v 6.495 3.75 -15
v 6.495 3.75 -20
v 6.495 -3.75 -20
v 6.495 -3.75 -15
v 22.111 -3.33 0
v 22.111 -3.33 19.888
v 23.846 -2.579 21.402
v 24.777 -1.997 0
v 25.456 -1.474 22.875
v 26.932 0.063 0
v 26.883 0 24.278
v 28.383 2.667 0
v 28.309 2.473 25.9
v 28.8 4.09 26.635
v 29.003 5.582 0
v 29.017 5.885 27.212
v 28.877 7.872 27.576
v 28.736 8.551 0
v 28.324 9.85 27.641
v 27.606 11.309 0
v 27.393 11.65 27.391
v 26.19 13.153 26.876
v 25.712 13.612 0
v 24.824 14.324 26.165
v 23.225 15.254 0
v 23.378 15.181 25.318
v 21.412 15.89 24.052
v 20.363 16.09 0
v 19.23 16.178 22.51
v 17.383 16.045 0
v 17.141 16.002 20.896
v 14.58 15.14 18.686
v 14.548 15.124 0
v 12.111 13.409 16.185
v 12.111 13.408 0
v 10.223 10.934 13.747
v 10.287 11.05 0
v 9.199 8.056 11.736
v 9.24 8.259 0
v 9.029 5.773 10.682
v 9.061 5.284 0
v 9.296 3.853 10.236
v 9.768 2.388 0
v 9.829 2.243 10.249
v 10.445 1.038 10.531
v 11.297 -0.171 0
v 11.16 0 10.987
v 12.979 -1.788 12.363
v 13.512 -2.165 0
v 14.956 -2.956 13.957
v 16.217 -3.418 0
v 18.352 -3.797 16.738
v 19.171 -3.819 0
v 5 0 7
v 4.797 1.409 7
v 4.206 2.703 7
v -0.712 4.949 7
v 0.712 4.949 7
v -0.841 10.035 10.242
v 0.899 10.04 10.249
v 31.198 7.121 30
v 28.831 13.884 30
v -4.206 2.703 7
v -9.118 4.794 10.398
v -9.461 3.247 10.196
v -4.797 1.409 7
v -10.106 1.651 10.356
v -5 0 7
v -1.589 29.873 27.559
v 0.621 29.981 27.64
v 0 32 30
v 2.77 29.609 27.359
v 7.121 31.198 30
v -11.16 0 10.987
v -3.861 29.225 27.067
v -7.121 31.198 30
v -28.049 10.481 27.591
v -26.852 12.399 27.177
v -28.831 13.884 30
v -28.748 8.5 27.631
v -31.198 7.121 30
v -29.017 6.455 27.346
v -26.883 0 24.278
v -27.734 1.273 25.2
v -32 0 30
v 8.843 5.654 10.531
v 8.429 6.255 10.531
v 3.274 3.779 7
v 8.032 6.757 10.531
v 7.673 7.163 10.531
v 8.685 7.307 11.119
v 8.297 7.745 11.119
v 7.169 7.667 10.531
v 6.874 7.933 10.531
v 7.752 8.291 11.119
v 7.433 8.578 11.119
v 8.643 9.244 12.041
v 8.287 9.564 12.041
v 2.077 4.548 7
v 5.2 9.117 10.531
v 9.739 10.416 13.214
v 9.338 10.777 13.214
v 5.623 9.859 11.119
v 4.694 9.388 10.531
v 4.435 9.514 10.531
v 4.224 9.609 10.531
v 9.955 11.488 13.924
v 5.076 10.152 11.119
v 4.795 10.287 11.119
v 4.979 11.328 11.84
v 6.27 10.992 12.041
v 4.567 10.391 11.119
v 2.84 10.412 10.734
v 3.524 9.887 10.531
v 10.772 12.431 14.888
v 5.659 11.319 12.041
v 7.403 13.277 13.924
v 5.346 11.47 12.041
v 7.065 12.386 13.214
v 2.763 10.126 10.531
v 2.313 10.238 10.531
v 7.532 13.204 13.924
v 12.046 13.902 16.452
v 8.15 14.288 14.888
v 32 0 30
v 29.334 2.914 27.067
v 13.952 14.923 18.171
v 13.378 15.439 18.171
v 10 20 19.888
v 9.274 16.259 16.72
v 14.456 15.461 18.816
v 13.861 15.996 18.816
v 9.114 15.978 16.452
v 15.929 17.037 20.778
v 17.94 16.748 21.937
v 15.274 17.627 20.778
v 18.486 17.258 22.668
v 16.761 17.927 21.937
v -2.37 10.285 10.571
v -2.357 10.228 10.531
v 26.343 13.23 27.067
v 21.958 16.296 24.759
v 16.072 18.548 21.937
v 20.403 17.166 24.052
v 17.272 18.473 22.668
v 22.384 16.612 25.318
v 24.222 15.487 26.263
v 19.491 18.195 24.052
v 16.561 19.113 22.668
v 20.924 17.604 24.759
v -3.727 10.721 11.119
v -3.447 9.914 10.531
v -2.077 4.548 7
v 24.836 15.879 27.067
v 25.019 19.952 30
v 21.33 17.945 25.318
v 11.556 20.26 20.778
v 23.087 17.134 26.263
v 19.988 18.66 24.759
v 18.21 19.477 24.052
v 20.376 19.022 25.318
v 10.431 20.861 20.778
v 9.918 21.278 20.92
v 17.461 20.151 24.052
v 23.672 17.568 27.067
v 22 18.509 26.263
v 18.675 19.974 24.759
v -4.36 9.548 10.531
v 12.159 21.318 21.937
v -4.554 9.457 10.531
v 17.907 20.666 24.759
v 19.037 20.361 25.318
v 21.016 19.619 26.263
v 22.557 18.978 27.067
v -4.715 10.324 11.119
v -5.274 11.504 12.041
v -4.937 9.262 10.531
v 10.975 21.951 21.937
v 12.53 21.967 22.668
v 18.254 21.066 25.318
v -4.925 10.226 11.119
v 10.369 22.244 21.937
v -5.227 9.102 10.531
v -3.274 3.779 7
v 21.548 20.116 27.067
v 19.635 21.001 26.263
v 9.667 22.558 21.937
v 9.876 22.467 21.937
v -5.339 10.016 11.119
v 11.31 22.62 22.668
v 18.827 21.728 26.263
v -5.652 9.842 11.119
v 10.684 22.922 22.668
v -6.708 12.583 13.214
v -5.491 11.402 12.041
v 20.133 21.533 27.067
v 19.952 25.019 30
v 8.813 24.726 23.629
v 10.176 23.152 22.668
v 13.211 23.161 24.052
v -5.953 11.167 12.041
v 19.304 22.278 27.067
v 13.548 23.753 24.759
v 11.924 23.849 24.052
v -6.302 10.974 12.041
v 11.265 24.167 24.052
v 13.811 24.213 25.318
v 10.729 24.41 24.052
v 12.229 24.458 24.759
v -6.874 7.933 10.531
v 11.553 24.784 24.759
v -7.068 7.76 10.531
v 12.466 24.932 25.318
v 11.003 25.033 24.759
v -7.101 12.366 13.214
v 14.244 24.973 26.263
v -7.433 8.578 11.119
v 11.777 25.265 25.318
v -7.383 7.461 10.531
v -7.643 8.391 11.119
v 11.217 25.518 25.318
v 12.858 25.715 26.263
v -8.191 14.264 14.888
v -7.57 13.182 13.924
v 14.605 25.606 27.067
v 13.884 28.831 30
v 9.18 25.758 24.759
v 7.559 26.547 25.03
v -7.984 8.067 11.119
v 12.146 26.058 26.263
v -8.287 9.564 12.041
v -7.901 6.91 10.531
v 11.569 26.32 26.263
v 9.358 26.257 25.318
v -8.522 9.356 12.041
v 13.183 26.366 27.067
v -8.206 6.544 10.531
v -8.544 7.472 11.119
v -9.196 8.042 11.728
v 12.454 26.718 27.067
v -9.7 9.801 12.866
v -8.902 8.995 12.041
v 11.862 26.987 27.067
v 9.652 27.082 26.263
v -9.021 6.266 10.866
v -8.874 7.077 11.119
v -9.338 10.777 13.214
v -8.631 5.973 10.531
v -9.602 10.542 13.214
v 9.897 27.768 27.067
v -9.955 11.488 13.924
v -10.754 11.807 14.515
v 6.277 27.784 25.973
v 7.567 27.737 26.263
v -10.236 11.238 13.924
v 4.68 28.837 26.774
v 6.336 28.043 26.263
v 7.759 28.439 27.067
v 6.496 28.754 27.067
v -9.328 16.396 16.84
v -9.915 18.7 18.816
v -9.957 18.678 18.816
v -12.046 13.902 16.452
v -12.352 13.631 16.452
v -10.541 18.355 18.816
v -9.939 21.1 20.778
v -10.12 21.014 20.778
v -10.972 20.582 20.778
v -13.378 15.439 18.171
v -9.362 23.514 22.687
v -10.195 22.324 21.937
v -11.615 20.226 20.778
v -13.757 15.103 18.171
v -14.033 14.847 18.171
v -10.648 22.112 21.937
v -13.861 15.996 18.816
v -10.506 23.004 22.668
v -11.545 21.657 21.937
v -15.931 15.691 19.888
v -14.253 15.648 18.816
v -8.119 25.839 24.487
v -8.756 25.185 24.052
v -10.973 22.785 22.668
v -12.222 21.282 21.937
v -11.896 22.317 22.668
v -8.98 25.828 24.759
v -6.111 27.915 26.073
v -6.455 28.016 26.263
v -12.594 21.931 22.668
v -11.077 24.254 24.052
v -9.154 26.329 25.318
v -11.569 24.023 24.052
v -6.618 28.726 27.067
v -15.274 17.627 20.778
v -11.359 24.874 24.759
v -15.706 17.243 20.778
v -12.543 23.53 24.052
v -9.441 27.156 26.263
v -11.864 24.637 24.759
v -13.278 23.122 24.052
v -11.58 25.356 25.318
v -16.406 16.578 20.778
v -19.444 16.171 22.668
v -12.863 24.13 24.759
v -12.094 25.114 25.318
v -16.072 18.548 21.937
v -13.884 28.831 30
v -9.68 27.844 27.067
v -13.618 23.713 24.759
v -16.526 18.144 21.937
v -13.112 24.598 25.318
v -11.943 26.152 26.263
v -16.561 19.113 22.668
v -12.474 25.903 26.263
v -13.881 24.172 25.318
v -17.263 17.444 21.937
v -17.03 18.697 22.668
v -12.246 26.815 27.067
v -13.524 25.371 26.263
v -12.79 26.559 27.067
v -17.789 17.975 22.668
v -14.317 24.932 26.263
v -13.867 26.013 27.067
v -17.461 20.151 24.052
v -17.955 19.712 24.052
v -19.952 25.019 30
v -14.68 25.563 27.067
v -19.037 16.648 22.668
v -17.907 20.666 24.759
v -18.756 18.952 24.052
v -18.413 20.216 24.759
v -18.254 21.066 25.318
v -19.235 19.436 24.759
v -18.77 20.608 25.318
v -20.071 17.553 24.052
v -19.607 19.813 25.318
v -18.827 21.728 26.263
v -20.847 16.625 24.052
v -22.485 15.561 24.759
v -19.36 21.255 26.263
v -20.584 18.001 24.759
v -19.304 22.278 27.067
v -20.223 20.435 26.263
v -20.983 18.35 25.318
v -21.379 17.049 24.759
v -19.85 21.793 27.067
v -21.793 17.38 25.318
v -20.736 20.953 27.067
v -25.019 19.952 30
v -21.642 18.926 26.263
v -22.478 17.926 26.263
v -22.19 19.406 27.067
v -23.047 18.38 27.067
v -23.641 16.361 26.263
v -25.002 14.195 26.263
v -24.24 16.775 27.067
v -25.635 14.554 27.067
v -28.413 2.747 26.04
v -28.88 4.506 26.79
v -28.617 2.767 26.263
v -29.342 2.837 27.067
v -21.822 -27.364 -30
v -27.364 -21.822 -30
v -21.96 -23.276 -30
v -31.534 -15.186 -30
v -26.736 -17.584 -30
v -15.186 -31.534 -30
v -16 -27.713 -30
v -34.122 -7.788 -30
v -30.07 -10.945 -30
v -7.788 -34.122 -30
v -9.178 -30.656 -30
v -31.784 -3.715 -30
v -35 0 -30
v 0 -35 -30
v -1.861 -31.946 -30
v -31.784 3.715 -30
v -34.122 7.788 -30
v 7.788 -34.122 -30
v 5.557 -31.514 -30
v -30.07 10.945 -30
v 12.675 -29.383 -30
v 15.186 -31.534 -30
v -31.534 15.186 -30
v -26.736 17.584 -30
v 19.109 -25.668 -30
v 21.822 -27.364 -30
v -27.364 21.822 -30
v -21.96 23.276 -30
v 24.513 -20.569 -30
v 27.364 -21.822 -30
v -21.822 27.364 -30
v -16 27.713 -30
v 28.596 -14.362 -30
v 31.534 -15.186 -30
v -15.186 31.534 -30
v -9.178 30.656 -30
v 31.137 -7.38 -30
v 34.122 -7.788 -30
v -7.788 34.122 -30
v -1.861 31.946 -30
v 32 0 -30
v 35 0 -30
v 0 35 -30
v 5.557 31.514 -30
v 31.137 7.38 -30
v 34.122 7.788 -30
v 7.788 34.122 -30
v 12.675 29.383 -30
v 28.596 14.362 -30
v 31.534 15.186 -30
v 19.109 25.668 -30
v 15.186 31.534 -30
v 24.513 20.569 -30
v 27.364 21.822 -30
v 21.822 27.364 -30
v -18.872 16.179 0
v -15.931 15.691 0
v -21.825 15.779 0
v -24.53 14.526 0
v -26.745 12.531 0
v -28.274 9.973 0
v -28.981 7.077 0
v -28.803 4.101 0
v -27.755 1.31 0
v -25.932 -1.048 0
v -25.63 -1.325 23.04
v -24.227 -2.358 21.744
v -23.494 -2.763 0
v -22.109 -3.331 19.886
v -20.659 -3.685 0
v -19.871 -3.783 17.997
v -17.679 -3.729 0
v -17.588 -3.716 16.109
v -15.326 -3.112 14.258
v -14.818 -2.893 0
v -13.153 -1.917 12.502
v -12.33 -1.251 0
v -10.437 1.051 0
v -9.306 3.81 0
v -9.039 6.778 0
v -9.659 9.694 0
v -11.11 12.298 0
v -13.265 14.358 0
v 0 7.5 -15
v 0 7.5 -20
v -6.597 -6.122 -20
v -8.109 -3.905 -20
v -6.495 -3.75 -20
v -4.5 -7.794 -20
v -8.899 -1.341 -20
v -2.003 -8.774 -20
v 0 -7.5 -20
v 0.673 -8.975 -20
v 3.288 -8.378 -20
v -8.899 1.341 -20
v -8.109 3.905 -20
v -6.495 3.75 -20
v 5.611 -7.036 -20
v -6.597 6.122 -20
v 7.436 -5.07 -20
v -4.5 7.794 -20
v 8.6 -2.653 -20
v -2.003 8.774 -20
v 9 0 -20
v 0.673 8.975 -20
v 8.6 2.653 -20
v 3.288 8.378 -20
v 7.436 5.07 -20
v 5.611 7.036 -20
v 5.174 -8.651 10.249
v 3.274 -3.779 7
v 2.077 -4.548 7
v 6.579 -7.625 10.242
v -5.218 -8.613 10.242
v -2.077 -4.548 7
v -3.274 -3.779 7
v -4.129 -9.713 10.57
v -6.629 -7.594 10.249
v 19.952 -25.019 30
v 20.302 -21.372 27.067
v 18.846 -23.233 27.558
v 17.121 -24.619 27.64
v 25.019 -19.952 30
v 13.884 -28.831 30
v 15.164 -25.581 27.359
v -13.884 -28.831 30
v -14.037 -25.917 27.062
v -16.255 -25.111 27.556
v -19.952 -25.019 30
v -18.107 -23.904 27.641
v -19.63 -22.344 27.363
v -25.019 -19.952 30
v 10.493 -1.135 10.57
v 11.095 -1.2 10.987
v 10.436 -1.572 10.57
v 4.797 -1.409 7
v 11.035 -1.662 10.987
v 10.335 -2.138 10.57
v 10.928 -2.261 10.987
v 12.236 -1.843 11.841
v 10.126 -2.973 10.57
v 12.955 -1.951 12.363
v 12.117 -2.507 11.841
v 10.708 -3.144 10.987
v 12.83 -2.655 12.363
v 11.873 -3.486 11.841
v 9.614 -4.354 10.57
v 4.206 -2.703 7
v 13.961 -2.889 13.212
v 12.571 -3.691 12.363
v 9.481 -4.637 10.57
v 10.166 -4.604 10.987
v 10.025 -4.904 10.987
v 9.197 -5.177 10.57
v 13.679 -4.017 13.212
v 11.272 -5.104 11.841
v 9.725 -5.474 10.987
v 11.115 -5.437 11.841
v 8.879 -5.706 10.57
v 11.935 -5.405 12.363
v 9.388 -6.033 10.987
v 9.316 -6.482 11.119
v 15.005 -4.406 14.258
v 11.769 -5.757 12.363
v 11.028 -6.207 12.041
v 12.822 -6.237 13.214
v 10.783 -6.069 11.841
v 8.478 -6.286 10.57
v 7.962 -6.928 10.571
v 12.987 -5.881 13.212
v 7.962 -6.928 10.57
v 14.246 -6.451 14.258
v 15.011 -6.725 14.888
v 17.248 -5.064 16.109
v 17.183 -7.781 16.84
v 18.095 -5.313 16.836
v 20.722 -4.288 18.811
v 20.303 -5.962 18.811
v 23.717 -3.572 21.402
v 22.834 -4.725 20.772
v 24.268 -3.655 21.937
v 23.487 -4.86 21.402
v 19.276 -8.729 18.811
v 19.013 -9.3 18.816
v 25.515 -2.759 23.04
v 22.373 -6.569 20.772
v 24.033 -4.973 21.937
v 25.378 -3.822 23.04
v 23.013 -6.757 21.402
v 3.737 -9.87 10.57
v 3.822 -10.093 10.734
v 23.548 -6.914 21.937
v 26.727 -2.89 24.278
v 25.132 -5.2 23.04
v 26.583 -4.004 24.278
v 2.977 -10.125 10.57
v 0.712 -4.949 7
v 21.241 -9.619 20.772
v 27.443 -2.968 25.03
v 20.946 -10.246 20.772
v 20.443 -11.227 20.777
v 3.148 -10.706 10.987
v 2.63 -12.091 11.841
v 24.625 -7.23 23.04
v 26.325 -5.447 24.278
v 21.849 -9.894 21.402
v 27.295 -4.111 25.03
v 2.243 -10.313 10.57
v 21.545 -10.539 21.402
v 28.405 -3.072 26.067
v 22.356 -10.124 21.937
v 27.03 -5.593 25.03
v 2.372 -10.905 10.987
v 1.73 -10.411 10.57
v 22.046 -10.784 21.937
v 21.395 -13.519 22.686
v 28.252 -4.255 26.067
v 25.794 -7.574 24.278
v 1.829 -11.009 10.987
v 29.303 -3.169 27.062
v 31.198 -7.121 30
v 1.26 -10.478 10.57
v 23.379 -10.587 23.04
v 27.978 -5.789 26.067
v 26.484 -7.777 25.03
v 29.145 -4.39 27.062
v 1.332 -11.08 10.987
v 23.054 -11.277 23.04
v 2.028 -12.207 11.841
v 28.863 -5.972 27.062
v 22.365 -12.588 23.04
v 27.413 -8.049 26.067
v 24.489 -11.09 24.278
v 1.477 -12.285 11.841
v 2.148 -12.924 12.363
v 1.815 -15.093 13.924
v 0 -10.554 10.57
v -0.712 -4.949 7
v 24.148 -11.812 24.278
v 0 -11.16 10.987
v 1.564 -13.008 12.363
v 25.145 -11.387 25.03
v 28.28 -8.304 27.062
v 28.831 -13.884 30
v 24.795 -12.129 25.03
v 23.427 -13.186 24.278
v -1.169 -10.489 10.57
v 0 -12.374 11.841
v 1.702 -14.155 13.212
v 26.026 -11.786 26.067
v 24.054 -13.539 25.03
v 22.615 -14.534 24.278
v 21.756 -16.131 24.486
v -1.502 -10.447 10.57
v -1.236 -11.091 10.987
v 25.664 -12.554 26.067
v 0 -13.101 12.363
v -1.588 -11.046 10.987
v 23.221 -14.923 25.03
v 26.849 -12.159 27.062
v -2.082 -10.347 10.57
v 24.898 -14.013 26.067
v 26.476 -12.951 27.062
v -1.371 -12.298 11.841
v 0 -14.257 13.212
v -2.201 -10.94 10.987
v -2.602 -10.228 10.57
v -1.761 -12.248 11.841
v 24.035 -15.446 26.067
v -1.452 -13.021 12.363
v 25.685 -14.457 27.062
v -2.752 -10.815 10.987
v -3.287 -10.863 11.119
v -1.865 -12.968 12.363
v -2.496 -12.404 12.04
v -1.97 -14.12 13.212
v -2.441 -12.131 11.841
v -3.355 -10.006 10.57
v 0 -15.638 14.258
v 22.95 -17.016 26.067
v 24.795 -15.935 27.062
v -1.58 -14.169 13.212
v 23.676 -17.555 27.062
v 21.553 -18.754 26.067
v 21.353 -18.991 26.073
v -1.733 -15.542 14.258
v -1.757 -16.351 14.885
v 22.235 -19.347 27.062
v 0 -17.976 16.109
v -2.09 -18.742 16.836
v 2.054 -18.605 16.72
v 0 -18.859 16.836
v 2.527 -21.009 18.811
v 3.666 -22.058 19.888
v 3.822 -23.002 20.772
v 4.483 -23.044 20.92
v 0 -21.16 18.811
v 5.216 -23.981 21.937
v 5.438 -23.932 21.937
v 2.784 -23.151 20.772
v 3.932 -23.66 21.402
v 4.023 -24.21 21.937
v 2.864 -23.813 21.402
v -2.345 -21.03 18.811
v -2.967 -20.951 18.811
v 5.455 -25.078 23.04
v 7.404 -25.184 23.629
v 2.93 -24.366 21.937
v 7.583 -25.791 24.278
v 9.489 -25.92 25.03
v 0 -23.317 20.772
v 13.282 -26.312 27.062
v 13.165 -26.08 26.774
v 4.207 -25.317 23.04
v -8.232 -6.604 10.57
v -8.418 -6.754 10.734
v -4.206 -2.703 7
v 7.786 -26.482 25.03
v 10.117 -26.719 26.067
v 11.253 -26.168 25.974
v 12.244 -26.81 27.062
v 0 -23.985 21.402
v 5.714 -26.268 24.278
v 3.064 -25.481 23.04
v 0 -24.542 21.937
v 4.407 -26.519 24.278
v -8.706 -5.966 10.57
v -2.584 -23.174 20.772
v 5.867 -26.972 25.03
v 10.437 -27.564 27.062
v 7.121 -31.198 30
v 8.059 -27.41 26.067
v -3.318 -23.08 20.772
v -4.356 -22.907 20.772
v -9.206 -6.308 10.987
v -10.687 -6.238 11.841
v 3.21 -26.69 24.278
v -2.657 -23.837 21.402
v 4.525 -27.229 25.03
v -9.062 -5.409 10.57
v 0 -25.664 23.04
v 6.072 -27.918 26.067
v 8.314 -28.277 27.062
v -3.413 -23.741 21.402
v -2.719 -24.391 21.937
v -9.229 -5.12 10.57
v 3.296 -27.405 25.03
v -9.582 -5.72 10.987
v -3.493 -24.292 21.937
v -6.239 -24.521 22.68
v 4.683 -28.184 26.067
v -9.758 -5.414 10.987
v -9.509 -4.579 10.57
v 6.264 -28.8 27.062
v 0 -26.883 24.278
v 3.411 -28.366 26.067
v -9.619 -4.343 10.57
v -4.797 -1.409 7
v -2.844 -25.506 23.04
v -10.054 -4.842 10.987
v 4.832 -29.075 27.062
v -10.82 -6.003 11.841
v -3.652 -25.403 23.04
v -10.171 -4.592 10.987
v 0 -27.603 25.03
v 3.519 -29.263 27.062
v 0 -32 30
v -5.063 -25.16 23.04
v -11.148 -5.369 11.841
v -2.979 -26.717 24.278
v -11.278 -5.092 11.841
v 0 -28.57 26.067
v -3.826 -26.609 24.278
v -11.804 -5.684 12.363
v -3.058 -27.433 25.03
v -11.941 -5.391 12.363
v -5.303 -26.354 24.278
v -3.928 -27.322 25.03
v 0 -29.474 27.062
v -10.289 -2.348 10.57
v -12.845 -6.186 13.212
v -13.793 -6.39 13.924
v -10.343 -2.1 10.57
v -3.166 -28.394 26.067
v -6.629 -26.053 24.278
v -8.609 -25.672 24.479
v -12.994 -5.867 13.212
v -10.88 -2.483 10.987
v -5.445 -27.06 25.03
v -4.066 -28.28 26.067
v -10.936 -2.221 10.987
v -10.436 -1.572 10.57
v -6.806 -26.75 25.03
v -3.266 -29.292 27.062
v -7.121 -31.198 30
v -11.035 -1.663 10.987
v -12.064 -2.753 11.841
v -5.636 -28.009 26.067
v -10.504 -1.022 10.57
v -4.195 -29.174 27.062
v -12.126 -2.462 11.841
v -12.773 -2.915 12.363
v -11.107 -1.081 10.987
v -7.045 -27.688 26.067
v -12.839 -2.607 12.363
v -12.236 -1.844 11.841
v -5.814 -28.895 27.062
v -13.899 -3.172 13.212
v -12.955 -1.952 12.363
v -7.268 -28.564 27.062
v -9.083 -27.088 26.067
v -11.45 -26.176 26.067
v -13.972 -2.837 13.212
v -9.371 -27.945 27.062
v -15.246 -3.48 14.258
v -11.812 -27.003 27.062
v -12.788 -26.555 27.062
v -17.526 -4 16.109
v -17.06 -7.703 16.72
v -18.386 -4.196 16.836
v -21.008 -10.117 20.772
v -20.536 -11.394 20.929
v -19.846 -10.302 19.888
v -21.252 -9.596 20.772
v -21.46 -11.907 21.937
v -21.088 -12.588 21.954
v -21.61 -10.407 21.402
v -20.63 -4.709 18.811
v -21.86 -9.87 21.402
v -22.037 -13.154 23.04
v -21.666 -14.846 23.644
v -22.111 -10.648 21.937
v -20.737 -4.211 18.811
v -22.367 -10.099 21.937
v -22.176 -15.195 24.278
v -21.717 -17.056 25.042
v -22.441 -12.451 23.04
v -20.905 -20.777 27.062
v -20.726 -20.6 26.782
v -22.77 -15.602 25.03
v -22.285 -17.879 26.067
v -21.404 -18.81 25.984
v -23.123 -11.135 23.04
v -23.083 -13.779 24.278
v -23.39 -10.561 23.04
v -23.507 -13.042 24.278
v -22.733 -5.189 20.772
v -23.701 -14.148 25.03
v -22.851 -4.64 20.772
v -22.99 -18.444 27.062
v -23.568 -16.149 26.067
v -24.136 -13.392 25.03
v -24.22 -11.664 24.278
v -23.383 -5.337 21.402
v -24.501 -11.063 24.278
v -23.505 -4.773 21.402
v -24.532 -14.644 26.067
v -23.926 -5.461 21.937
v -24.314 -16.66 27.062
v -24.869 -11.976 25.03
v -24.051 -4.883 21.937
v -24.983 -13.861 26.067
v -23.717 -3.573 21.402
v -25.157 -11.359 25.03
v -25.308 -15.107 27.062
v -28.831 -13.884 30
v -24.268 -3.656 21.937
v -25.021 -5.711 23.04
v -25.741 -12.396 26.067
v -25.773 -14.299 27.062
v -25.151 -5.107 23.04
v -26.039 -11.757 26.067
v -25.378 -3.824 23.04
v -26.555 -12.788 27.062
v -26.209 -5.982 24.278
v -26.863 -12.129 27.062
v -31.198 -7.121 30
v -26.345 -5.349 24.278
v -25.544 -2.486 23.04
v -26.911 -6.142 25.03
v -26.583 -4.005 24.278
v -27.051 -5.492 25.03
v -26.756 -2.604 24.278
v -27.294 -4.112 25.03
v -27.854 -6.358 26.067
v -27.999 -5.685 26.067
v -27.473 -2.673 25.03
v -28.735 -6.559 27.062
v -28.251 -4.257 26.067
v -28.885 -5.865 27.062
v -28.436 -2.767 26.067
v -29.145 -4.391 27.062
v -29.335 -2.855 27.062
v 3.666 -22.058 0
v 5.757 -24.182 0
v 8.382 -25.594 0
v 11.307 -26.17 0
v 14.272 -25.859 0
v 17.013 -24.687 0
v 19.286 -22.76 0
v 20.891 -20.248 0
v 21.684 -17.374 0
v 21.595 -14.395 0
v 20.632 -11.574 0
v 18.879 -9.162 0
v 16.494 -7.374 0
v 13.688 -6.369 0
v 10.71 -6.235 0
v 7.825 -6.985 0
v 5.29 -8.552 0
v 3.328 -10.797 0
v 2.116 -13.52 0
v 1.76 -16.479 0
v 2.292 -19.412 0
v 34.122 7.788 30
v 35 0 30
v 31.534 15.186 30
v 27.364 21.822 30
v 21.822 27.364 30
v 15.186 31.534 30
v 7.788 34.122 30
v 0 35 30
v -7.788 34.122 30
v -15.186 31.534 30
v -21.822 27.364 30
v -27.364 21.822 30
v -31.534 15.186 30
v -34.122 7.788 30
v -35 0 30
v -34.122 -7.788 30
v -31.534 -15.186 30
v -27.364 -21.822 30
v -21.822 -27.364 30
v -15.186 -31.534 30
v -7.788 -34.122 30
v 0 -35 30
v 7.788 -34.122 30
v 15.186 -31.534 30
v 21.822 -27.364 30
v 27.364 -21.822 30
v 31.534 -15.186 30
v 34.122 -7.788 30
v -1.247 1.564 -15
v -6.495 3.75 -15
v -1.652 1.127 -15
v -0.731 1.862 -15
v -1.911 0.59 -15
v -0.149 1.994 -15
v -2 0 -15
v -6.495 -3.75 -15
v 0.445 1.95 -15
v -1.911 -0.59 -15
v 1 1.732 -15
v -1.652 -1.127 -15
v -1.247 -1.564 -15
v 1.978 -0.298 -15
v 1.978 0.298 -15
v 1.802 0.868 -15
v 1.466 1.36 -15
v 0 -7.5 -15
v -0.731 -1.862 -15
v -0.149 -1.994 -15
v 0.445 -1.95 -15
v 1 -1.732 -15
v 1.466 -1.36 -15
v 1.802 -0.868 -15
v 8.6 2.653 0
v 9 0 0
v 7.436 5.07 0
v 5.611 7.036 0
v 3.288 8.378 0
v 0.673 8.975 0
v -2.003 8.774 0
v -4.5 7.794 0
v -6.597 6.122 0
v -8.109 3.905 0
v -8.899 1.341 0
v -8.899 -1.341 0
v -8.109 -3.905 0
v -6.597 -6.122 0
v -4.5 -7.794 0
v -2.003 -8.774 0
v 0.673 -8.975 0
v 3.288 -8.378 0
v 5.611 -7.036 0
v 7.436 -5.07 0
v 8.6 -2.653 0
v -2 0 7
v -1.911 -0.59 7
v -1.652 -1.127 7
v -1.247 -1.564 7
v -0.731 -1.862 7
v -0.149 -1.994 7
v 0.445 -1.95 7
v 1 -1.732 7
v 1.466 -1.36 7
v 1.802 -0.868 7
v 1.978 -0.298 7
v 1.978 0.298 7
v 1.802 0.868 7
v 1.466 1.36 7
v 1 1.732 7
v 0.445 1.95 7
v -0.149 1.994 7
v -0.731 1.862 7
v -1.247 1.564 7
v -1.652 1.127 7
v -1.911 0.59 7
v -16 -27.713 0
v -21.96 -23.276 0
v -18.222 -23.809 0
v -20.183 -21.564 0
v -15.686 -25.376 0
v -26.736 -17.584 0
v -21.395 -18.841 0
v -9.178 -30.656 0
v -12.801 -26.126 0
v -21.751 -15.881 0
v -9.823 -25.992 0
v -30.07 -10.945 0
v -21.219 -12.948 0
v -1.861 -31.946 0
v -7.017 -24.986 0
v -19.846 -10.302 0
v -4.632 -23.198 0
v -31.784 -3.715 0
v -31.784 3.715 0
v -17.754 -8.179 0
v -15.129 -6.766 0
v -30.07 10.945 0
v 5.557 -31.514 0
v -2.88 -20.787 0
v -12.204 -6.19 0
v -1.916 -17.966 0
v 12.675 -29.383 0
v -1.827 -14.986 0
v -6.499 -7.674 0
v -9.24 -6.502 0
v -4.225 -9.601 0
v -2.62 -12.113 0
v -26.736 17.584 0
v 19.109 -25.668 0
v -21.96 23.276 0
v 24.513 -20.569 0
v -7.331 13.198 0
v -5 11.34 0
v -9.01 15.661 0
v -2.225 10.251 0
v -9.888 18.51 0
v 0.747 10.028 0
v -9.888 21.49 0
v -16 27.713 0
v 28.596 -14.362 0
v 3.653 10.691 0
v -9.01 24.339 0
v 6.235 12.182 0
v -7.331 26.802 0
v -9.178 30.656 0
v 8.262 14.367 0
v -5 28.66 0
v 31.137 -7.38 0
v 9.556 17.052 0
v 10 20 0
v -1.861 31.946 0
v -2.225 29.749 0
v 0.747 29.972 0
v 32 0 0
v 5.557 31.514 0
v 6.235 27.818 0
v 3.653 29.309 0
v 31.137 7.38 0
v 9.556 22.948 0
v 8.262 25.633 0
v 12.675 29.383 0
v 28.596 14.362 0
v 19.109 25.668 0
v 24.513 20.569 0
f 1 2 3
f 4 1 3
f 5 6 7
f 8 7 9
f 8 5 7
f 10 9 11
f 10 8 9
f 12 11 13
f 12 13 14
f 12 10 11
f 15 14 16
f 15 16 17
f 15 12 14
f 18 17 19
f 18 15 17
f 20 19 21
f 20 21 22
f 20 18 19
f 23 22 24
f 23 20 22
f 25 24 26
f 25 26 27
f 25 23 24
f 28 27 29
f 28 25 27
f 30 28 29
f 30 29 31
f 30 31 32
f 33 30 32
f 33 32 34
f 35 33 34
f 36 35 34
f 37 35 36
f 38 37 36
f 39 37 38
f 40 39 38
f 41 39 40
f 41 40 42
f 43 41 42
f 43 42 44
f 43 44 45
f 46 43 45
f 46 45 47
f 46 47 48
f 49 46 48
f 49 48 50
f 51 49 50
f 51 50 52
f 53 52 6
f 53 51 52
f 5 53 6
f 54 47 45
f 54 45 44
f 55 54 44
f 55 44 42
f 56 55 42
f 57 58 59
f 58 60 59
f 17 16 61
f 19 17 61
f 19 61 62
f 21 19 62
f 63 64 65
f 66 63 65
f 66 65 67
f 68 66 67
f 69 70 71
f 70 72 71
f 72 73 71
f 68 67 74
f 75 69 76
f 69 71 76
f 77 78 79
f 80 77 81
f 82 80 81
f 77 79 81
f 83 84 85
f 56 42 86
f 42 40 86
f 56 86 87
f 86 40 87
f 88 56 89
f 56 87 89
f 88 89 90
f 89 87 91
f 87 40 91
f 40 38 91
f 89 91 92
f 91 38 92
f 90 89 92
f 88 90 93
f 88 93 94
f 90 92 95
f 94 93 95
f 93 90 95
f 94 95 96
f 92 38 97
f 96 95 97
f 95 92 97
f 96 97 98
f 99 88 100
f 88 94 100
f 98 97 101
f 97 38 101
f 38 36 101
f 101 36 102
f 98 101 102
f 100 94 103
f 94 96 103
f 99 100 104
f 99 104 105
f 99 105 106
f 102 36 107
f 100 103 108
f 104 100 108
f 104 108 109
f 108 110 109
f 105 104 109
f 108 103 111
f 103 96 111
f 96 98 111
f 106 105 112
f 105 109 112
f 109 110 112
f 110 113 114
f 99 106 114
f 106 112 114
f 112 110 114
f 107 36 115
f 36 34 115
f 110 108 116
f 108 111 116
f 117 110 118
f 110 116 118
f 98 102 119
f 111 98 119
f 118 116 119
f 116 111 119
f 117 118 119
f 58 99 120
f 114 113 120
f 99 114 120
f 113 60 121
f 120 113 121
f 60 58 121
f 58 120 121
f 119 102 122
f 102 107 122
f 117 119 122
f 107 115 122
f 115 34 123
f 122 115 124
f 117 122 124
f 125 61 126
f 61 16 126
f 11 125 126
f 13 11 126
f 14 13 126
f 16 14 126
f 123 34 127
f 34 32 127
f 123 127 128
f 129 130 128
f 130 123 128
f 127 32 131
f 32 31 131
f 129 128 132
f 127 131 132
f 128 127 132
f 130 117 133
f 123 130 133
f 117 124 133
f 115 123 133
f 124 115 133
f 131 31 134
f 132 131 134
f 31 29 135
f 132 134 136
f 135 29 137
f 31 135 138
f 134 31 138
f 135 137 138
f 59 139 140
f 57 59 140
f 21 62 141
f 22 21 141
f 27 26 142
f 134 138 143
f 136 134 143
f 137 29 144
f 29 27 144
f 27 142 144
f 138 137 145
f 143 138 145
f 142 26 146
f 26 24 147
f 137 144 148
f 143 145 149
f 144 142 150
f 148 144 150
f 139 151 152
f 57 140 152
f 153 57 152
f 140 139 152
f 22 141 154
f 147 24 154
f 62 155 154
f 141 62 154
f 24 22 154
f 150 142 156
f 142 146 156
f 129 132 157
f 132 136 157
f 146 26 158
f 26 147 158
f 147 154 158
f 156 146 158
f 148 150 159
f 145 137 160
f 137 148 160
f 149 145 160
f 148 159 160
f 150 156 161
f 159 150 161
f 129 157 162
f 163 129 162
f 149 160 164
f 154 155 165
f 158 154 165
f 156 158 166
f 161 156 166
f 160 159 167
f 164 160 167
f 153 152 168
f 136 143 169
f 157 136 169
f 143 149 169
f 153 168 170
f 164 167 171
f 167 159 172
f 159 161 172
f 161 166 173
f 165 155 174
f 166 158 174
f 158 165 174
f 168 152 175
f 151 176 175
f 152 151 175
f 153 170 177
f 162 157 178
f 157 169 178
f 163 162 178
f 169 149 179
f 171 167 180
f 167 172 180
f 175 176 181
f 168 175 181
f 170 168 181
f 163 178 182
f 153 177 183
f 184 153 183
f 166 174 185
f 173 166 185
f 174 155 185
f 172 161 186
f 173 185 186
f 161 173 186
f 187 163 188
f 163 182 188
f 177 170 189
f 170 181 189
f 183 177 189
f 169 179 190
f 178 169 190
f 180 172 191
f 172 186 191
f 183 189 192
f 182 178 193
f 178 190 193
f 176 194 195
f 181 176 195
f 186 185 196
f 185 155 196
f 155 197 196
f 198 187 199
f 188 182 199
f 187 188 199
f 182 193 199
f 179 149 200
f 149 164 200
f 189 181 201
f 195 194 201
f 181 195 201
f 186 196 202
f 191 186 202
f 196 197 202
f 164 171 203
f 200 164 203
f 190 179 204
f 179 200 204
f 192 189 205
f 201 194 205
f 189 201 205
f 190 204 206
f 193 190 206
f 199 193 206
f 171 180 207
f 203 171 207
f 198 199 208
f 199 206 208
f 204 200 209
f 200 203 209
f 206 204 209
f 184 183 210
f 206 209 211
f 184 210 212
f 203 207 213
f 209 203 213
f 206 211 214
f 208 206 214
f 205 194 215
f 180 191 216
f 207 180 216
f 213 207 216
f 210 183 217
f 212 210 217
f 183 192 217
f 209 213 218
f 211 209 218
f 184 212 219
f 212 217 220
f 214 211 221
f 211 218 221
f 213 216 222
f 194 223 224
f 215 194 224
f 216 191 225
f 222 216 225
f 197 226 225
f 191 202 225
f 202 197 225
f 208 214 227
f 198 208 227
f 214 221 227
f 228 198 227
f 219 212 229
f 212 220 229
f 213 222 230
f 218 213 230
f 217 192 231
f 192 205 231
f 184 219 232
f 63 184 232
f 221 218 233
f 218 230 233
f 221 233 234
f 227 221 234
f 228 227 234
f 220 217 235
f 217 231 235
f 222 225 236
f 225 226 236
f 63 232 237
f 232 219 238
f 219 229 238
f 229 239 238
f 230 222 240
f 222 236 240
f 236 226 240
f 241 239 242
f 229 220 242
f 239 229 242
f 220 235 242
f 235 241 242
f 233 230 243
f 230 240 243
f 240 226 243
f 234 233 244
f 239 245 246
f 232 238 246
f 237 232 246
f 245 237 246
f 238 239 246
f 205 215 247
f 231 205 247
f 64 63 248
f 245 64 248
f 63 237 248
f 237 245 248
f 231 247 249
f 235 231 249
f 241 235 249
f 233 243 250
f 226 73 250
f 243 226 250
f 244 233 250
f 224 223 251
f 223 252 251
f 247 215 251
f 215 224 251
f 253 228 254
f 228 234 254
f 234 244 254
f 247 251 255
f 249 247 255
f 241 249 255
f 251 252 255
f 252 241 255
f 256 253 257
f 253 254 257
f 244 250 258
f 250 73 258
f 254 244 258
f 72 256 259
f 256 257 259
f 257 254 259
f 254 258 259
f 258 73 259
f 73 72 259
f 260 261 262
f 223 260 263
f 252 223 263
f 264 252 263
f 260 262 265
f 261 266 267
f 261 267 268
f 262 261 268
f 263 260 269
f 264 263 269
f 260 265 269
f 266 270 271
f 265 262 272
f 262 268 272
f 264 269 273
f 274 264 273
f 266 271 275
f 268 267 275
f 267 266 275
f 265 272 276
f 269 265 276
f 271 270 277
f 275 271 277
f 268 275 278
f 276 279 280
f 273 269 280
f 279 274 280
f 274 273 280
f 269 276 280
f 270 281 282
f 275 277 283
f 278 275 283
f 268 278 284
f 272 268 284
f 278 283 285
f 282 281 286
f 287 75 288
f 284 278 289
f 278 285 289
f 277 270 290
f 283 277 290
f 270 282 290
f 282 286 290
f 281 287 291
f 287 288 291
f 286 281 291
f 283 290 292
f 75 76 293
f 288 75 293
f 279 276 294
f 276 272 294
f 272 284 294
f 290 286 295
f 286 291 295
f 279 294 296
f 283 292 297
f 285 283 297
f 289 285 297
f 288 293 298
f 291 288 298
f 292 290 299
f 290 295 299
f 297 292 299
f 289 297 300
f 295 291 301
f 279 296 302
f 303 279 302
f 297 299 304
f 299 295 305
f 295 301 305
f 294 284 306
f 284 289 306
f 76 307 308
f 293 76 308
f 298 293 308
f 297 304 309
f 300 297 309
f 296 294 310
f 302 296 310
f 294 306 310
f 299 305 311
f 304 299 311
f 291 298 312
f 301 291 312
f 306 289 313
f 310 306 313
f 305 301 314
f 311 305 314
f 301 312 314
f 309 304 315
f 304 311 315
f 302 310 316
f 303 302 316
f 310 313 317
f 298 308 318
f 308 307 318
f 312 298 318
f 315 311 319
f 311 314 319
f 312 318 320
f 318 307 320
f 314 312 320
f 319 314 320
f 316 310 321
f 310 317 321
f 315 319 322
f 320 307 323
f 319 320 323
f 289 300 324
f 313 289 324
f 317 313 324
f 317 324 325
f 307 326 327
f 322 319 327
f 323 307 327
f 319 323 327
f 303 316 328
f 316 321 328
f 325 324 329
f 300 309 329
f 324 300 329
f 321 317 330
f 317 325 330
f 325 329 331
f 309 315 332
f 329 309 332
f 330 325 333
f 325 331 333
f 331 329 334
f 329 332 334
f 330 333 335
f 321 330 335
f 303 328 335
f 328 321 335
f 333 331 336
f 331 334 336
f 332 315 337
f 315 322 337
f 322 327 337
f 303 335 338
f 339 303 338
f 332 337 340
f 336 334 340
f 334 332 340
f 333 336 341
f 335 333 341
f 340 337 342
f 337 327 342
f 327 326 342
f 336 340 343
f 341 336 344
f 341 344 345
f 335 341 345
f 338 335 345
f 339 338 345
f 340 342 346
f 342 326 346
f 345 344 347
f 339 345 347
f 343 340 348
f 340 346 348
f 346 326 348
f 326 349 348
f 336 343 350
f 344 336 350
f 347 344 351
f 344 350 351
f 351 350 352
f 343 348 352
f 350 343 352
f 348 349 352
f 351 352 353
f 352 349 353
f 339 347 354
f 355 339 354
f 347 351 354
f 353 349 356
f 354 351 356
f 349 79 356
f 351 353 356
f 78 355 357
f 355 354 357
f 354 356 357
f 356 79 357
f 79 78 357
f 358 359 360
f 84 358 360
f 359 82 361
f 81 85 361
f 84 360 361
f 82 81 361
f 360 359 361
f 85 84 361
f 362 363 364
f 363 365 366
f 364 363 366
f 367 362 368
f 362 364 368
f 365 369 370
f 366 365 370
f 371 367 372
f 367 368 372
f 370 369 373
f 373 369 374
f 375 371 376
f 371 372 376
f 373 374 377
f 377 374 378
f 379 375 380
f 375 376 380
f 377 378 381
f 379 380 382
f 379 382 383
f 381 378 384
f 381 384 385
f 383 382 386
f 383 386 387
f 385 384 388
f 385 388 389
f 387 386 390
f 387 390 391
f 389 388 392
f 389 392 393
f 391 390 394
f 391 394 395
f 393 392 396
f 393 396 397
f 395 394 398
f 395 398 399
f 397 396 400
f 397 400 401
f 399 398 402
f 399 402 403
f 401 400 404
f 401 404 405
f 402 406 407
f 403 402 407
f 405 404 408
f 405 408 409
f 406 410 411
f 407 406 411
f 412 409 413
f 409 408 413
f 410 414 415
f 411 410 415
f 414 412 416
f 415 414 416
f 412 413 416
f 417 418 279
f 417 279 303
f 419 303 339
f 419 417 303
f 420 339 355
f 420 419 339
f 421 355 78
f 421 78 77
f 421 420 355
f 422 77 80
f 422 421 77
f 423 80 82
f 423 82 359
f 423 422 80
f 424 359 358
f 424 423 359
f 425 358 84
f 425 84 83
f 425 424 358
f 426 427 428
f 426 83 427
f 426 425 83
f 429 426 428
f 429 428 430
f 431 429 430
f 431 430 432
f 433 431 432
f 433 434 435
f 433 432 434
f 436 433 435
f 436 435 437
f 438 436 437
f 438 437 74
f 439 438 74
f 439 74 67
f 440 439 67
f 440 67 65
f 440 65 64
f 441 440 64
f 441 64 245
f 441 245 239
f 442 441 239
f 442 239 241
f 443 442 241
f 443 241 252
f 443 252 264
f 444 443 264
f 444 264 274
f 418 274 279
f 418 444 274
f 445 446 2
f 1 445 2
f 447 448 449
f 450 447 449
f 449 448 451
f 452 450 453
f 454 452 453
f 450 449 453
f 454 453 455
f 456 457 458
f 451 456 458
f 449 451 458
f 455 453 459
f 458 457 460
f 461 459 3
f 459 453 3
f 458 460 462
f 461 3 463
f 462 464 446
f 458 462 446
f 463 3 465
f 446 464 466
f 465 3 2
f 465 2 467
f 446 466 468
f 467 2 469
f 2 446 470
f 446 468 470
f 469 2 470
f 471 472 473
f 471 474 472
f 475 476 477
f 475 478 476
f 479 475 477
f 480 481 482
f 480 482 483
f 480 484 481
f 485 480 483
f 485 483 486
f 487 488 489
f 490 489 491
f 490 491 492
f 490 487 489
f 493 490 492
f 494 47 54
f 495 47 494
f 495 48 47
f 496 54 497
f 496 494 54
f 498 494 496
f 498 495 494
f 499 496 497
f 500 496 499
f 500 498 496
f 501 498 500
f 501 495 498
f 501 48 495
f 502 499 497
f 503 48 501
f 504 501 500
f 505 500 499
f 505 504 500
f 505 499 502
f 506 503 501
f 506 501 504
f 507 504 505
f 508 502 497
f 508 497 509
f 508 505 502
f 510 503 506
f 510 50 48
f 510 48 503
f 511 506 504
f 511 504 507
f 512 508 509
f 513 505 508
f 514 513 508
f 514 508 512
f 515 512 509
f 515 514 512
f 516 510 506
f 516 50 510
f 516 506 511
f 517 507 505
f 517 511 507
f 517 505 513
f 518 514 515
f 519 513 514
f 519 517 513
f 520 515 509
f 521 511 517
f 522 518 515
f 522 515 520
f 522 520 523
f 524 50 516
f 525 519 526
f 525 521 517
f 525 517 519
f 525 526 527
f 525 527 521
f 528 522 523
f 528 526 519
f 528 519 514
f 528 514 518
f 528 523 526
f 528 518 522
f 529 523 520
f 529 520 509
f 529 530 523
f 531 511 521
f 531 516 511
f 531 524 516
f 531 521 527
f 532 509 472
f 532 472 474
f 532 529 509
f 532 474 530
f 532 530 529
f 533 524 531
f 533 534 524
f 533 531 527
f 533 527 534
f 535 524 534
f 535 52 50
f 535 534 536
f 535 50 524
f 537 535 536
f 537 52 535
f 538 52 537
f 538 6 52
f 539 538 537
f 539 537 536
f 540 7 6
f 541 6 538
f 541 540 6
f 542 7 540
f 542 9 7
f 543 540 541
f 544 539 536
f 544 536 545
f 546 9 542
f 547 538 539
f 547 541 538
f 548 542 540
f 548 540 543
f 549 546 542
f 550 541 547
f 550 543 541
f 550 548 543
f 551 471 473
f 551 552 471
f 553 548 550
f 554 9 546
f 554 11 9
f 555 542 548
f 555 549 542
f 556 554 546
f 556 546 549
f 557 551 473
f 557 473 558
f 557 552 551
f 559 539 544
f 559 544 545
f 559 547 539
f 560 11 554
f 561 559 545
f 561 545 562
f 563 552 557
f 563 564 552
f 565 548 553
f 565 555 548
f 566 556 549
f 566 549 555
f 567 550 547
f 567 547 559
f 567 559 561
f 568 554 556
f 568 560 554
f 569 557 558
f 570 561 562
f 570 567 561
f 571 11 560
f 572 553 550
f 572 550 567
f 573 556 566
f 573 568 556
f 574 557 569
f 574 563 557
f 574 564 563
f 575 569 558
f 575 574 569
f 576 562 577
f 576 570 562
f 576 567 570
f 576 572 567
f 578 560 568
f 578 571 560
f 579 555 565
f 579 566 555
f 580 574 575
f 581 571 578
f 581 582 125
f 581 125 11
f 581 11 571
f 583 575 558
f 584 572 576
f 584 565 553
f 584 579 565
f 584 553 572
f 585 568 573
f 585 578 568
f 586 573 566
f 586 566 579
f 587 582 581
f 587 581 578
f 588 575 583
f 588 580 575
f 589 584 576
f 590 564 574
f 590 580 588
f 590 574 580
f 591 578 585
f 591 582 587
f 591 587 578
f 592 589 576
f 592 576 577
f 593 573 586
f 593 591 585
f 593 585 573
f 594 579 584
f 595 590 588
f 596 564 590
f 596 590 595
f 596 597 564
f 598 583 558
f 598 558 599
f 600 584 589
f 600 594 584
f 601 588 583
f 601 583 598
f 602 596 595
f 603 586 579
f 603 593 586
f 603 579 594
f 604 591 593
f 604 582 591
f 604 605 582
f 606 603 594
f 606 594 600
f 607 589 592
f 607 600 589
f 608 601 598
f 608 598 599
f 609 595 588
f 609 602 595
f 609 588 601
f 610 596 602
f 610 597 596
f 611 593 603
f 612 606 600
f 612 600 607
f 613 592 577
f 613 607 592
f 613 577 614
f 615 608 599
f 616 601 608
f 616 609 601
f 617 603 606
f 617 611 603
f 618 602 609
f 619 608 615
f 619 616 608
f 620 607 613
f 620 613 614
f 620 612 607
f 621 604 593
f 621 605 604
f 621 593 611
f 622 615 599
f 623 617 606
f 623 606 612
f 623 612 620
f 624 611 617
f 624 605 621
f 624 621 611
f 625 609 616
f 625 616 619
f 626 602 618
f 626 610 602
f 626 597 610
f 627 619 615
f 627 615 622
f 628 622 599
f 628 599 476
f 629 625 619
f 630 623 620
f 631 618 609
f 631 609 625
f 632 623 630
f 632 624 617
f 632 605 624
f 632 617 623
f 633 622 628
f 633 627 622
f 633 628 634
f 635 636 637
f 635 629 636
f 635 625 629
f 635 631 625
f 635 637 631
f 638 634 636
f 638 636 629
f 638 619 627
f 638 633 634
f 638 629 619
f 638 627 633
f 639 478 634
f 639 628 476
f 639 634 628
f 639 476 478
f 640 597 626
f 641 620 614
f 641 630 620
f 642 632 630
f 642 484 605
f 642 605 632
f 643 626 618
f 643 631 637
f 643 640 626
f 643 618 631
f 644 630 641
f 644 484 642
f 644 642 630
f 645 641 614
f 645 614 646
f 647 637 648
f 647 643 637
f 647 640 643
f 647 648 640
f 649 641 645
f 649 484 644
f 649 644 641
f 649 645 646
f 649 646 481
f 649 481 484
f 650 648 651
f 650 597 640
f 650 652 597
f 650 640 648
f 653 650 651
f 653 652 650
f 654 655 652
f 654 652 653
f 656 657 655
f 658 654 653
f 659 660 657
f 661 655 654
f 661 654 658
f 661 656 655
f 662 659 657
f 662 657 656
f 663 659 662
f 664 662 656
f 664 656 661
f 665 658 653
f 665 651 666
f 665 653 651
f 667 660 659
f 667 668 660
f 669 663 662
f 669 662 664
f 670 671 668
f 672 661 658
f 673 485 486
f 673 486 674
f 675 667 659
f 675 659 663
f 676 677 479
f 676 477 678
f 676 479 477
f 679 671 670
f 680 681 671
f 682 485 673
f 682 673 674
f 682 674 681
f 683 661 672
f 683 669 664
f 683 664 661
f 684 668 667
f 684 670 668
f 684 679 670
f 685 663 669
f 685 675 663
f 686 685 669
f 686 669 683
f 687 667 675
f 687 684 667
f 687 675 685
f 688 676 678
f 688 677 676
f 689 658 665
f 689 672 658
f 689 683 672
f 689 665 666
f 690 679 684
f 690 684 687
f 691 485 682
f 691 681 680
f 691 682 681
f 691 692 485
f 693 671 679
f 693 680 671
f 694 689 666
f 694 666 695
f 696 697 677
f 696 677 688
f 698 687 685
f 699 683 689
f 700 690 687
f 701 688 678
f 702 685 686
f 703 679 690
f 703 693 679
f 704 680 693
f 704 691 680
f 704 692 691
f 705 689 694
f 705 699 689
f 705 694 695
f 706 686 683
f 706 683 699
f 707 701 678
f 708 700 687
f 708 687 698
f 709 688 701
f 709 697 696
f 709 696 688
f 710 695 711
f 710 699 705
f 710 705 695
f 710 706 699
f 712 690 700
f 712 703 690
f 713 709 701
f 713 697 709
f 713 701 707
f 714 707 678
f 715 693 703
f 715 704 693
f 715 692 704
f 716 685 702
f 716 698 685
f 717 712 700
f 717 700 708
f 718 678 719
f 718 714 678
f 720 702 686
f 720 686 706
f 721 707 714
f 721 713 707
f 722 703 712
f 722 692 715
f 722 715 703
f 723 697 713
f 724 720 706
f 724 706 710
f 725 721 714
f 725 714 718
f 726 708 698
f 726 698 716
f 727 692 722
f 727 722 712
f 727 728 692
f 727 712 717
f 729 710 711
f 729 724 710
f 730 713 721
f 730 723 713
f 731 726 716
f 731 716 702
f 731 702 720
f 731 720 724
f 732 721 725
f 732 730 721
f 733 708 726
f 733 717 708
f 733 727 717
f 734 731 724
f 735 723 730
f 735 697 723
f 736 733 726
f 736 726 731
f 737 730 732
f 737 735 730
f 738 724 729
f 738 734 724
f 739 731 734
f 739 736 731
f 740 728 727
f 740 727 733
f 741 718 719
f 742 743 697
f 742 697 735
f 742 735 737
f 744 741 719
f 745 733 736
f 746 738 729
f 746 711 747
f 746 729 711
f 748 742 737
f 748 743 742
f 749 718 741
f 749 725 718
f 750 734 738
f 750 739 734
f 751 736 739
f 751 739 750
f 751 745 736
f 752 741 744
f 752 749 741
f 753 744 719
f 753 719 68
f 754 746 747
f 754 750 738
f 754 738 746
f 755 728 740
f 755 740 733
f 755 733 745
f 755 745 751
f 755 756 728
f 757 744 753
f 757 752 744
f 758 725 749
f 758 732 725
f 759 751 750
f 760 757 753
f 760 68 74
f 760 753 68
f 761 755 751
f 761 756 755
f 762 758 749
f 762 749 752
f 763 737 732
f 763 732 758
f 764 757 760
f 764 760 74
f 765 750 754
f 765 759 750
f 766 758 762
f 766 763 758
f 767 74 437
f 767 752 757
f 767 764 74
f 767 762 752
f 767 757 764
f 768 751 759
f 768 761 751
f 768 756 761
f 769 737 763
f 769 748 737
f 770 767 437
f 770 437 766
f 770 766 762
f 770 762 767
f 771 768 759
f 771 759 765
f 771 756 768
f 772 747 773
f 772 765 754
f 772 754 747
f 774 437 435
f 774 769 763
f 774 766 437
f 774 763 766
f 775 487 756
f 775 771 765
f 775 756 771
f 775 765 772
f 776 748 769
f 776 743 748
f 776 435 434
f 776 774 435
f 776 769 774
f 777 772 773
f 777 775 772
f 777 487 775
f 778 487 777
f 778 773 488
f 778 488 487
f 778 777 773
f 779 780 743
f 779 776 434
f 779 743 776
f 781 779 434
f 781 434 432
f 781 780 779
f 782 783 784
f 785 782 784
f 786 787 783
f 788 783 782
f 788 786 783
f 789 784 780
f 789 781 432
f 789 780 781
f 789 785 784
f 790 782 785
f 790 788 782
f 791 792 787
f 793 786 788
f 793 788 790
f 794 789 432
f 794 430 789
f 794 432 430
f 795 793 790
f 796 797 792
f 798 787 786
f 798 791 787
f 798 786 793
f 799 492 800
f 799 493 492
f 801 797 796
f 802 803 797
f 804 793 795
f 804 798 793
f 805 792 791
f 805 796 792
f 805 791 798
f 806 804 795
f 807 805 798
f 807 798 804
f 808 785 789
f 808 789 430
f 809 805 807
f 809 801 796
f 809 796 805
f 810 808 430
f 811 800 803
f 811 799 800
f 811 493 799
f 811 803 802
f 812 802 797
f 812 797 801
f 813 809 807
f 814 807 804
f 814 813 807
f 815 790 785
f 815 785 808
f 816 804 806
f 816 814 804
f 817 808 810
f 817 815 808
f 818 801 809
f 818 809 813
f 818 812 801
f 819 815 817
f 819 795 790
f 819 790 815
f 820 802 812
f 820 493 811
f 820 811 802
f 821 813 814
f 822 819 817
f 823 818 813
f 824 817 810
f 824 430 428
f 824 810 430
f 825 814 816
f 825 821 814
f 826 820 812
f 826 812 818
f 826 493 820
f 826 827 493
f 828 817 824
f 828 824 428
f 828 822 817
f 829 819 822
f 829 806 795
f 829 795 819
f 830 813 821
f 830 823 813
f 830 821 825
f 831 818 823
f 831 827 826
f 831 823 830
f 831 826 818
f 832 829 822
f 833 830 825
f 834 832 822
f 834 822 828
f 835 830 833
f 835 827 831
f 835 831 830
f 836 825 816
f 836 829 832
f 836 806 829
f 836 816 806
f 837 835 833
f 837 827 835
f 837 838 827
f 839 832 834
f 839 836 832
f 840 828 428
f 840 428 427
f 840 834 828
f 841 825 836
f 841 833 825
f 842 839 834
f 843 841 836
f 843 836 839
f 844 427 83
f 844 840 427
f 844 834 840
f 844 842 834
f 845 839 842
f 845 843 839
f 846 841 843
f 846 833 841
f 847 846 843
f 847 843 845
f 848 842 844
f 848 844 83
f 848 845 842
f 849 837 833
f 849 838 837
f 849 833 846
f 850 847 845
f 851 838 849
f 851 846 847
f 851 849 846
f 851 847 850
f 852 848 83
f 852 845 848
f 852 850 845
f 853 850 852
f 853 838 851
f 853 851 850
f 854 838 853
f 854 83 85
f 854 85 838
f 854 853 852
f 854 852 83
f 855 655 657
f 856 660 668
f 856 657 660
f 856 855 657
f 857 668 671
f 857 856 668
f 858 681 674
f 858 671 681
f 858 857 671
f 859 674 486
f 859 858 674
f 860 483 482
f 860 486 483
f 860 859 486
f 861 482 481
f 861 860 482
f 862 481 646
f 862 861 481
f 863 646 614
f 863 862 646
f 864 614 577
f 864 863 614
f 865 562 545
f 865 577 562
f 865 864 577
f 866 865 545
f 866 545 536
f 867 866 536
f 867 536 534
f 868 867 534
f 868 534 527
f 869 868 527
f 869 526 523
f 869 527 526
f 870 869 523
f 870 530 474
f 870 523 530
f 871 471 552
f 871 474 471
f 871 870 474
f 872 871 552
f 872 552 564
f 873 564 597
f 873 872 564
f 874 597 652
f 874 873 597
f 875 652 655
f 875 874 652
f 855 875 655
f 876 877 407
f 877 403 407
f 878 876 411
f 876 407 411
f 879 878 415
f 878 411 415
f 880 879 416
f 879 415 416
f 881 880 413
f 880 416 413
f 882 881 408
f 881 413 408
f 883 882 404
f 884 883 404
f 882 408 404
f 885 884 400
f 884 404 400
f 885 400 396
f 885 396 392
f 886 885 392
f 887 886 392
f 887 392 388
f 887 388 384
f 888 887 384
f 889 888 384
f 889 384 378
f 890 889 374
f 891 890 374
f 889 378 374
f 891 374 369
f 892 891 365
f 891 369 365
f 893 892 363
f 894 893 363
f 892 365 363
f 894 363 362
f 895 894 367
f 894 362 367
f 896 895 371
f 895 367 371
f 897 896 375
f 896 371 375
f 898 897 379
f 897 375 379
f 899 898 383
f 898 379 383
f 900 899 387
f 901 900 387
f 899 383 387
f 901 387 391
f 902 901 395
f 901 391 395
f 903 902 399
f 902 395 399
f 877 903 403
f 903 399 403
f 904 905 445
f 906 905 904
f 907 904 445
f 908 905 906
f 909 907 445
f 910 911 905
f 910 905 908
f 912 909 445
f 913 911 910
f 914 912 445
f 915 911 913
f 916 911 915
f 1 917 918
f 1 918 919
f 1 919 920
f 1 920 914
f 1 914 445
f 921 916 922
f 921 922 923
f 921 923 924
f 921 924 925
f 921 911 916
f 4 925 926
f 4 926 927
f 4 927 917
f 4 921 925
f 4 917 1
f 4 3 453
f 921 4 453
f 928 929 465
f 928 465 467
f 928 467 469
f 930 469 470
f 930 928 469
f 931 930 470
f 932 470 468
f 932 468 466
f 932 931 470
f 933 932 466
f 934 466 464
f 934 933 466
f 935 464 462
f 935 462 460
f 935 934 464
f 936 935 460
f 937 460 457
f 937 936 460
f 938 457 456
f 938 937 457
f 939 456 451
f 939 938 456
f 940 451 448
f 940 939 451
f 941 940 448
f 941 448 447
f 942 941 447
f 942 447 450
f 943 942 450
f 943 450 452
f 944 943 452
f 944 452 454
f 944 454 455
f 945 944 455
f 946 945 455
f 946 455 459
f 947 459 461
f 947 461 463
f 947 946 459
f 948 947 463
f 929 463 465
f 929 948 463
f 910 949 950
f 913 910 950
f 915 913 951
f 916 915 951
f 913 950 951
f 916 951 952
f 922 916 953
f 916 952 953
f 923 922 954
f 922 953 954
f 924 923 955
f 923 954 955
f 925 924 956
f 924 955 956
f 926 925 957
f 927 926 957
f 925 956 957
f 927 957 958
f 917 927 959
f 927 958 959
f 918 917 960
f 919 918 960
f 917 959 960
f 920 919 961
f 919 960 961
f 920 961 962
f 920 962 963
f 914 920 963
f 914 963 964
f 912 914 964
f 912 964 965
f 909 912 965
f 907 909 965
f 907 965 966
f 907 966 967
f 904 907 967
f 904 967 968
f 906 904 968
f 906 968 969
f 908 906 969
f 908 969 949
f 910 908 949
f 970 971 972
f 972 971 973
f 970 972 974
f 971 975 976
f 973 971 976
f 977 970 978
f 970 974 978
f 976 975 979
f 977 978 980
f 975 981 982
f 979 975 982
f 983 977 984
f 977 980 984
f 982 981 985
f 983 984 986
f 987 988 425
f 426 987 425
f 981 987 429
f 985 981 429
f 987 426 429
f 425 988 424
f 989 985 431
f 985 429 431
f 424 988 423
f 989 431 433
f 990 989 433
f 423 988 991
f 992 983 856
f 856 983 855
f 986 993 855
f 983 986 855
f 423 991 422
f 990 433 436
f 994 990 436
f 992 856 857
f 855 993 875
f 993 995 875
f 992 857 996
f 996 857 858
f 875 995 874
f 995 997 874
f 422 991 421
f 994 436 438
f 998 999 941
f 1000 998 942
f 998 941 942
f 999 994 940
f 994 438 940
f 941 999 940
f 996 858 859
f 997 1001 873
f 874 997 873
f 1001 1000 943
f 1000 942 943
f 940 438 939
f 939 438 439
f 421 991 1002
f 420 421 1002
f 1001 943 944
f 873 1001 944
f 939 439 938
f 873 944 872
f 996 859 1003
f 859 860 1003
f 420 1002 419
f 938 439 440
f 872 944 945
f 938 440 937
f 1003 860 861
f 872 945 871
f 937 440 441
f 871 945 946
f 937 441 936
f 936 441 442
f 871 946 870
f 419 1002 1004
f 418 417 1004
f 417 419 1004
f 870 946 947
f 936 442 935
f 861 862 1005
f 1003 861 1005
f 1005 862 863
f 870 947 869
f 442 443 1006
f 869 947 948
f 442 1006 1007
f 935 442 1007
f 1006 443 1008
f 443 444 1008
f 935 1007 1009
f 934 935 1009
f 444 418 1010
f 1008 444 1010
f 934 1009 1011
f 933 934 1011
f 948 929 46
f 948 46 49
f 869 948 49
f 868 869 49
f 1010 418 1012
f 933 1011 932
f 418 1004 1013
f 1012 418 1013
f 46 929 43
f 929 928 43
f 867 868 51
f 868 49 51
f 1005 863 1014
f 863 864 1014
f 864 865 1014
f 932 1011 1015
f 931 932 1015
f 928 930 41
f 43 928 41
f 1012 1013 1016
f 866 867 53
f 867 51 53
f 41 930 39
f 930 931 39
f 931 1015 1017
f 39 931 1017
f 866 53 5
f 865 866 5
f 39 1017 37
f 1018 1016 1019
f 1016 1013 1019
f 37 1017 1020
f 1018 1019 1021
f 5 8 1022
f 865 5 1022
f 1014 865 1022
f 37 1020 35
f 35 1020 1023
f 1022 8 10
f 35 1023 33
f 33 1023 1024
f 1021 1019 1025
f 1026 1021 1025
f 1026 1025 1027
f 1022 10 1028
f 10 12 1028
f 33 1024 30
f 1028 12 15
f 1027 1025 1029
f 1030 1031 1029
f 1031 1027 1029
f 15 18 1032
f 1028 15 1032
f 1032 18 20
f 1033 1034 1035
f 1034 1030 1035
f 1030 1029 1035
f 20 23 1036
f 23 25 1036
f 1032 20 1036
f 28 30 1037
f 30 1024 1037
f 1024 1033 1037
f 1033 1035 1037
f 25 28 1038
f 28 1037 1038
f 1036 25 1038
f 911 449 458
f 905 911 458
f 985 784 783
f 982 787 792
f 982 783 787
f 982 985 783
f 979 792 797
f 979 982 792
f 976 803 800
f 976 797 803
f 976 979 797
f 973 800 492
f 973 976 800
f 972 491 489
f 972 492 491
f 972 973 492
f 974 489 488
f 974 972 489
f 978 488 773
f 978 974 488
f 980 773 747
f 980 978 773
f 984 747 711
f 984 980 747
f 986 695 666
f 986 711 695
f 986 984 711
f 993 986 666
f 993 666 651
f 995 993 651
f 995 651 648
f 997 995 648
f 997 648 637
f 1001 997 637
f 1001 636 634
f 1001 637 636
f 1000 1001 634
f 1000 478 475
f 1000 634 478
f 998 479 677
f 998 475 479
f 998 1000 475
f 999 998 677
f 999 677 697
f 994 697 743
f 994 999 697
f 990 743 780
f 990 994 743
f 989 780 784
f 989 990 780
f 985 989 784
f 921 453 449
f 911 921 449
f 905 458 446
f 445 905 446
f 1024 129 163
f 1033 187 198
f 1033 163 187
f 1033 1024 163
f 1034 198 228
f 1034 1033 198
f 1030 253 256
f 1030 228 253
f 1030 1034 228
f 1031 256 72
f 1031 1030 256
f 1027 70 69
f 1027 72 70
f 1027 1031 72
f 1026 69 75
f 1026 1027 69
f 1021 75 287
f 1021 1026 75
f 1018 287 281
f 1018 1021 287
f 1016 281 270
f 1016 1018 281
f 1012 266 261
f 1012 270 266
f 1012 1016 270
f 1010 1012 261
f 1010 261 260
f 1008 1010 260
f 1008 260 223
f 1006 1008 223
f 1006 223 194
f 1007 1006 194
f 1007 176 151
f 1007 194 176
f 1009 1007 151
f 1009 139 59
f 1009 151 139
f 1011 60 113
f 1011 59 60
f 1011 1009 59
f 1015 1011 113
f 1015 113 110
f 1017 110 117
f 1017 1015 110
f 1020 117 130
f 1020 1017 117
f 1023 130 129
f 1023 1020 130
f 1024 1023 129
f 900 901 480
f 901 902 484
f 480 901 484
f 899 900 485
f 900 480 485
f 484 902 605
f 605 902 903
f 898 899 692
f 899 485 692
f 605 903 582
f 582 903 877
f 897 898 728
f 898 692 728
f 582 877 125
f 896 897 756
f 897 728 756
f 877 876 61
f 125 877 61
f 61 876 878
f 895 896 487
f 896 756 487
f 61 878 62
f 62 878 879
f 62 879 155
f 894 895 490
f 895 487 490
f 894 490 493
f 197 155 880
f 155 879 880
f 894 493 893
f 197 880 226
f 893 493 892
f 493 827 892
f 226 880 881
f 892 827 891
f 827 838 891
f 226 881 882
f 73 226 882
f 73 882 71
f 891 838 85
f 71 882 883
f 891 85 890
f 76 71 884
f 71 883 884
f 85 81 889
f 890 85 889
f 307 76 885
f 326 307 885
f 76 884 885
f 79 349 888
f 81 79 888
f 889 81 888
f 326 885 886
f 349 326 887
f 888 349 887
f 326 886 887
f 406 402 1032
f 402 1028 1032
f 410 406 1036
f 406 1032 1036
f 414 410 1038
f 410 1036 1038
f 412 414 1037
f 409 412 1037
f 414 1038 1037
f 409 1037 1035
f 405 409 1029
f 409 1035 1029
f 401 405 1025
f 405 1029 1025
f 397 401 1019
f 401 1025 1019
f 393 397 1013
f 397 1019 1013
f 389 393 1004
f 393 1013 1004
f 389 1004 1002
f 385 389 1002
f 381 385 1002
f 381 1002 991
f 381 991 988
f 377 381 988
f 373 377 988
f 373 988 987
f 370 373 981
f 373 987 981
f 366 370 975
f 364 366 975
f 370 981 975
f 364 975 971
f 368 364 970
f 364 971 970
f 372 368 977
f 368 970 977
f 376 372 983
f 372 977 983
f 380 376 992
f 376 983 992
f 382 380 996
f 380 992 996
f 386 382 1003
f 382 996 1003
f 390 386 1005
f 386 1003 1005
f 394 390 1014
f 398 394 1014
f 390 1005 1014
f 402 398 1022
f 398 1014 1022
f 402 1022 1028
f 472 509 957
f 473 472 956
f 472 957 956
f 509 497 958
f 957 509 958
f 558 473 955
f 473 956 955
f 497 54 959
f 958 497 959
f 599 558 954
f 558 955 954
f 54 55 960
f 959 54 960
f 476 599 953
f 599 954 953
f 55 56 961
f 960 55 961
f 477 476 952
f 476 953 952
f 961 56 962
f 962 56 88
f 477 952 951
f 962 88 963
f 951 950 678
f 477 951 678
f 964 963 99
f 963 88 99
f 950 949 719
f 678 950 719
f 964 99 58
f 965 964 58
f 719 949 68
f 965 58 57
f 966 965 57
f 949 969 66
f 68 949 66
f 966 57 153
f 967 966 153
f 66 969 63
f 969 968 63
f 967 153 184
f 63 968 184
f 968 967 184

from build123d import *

# Parameters (mm, degrees)
REVOLUTION_ANGLE   = -360
SKETCH006_R        = 10
POCKET_DEPTH       = 261.517738
POLARPATTERN_COUNT = 5
SKETCH007_R        = 9
PAD_DEPTH          = 20
POCKET001_DEPTH    = 5
SKETCH009_R        = 2
POCKET002_DEPTH    = 37.001


with BuildPart() as part:
    # Sketch004 → Revolution (revolve, symmetric)
    with BuildSketch(Plane.XZ) as revolution_sk:
        with BuildLine():
            Line((0, 0), (0, 7))
            Line((0, 7), (5, 7))
            add(Edge.make_bspline(
                [(5, 7), (20.98773, 16.664236), (32, 30)],
                knots=[0, 0, 0, 1, 1, 1], degree=2))
            Line((32, 30), (35, 30))
            Line((35, 30), (35, -30))
            Line((35, -30), (32, -30))
            Line((32, -30), (32, 0))
            Line((32, 0), (0, 0))
        make_face()
    revolve(axis=Axis((0, 0, 0), (0, 0, 1)), revolution_arc=REVOLUTION_ANGLE / 2)
    revolve(revolution_sk.sketch, axis=Axis((0, 0, 0), (0, 0, -1)), revolution_arc=REVOLUTION_ANGLE / 2)

    # Sketch006 → Pocket (cut, through all)
    with BuildSketch(Plane.XY):
        with Locations((0, 20)):
            Circle(SKETCH006_R)
    pocket = extrude(amount=POCKET_DEPTH, mode=Mode.SUBTRACT)

    # PolarPattern: Pocket ×5 about axis
    polarpattern_axis = Axis((0, 0, 0), (0, 0, 1))
    for i in range(1, POLARPATTERN_COUNT):
        add(pocket.rotate(polarpattern_axis, i * 360 / POLARPATTERN_COUNT), mode=Mode.SUBTRACT)

    # Sketch007 → Pad (join)
    with BuildSketch(Plane.XY):
        Circle(SKETCH007_R)
    extrude(amount=-PAD_DEPTH)

    # Sketch008 (on Face14 of Pad) → Pocket001 (cut)
    with BuildSketch(Plane(origin=(0, 0, -20), x_dir=(1, 0, 0), z_dir=(0, 0, -1))):
        Polygon((6.495191, -3.75), (6.495191, 3.75), (0, 7.5), (-6.495191, 3.75), (-6.495191, -3.75), (0, -7.5), align=None)
    extrude(amount=-POCKET001_DEPTH, mode=Mode.SUBTRACT)

    # Sketch009 (on Face1 of Pocket001) → Pocket002 (cut, through all)
    with BuildSketch(Plane(origin=(0, 0, 7), x_dir=(-1, 0, 0), z_dir=(0, 0, 1))):
        Circle(SKETCH009_R)
    extrude(amount=-POCKET002_DEPTH, mode=Mode.SUBTRACT)


solid = part.part
